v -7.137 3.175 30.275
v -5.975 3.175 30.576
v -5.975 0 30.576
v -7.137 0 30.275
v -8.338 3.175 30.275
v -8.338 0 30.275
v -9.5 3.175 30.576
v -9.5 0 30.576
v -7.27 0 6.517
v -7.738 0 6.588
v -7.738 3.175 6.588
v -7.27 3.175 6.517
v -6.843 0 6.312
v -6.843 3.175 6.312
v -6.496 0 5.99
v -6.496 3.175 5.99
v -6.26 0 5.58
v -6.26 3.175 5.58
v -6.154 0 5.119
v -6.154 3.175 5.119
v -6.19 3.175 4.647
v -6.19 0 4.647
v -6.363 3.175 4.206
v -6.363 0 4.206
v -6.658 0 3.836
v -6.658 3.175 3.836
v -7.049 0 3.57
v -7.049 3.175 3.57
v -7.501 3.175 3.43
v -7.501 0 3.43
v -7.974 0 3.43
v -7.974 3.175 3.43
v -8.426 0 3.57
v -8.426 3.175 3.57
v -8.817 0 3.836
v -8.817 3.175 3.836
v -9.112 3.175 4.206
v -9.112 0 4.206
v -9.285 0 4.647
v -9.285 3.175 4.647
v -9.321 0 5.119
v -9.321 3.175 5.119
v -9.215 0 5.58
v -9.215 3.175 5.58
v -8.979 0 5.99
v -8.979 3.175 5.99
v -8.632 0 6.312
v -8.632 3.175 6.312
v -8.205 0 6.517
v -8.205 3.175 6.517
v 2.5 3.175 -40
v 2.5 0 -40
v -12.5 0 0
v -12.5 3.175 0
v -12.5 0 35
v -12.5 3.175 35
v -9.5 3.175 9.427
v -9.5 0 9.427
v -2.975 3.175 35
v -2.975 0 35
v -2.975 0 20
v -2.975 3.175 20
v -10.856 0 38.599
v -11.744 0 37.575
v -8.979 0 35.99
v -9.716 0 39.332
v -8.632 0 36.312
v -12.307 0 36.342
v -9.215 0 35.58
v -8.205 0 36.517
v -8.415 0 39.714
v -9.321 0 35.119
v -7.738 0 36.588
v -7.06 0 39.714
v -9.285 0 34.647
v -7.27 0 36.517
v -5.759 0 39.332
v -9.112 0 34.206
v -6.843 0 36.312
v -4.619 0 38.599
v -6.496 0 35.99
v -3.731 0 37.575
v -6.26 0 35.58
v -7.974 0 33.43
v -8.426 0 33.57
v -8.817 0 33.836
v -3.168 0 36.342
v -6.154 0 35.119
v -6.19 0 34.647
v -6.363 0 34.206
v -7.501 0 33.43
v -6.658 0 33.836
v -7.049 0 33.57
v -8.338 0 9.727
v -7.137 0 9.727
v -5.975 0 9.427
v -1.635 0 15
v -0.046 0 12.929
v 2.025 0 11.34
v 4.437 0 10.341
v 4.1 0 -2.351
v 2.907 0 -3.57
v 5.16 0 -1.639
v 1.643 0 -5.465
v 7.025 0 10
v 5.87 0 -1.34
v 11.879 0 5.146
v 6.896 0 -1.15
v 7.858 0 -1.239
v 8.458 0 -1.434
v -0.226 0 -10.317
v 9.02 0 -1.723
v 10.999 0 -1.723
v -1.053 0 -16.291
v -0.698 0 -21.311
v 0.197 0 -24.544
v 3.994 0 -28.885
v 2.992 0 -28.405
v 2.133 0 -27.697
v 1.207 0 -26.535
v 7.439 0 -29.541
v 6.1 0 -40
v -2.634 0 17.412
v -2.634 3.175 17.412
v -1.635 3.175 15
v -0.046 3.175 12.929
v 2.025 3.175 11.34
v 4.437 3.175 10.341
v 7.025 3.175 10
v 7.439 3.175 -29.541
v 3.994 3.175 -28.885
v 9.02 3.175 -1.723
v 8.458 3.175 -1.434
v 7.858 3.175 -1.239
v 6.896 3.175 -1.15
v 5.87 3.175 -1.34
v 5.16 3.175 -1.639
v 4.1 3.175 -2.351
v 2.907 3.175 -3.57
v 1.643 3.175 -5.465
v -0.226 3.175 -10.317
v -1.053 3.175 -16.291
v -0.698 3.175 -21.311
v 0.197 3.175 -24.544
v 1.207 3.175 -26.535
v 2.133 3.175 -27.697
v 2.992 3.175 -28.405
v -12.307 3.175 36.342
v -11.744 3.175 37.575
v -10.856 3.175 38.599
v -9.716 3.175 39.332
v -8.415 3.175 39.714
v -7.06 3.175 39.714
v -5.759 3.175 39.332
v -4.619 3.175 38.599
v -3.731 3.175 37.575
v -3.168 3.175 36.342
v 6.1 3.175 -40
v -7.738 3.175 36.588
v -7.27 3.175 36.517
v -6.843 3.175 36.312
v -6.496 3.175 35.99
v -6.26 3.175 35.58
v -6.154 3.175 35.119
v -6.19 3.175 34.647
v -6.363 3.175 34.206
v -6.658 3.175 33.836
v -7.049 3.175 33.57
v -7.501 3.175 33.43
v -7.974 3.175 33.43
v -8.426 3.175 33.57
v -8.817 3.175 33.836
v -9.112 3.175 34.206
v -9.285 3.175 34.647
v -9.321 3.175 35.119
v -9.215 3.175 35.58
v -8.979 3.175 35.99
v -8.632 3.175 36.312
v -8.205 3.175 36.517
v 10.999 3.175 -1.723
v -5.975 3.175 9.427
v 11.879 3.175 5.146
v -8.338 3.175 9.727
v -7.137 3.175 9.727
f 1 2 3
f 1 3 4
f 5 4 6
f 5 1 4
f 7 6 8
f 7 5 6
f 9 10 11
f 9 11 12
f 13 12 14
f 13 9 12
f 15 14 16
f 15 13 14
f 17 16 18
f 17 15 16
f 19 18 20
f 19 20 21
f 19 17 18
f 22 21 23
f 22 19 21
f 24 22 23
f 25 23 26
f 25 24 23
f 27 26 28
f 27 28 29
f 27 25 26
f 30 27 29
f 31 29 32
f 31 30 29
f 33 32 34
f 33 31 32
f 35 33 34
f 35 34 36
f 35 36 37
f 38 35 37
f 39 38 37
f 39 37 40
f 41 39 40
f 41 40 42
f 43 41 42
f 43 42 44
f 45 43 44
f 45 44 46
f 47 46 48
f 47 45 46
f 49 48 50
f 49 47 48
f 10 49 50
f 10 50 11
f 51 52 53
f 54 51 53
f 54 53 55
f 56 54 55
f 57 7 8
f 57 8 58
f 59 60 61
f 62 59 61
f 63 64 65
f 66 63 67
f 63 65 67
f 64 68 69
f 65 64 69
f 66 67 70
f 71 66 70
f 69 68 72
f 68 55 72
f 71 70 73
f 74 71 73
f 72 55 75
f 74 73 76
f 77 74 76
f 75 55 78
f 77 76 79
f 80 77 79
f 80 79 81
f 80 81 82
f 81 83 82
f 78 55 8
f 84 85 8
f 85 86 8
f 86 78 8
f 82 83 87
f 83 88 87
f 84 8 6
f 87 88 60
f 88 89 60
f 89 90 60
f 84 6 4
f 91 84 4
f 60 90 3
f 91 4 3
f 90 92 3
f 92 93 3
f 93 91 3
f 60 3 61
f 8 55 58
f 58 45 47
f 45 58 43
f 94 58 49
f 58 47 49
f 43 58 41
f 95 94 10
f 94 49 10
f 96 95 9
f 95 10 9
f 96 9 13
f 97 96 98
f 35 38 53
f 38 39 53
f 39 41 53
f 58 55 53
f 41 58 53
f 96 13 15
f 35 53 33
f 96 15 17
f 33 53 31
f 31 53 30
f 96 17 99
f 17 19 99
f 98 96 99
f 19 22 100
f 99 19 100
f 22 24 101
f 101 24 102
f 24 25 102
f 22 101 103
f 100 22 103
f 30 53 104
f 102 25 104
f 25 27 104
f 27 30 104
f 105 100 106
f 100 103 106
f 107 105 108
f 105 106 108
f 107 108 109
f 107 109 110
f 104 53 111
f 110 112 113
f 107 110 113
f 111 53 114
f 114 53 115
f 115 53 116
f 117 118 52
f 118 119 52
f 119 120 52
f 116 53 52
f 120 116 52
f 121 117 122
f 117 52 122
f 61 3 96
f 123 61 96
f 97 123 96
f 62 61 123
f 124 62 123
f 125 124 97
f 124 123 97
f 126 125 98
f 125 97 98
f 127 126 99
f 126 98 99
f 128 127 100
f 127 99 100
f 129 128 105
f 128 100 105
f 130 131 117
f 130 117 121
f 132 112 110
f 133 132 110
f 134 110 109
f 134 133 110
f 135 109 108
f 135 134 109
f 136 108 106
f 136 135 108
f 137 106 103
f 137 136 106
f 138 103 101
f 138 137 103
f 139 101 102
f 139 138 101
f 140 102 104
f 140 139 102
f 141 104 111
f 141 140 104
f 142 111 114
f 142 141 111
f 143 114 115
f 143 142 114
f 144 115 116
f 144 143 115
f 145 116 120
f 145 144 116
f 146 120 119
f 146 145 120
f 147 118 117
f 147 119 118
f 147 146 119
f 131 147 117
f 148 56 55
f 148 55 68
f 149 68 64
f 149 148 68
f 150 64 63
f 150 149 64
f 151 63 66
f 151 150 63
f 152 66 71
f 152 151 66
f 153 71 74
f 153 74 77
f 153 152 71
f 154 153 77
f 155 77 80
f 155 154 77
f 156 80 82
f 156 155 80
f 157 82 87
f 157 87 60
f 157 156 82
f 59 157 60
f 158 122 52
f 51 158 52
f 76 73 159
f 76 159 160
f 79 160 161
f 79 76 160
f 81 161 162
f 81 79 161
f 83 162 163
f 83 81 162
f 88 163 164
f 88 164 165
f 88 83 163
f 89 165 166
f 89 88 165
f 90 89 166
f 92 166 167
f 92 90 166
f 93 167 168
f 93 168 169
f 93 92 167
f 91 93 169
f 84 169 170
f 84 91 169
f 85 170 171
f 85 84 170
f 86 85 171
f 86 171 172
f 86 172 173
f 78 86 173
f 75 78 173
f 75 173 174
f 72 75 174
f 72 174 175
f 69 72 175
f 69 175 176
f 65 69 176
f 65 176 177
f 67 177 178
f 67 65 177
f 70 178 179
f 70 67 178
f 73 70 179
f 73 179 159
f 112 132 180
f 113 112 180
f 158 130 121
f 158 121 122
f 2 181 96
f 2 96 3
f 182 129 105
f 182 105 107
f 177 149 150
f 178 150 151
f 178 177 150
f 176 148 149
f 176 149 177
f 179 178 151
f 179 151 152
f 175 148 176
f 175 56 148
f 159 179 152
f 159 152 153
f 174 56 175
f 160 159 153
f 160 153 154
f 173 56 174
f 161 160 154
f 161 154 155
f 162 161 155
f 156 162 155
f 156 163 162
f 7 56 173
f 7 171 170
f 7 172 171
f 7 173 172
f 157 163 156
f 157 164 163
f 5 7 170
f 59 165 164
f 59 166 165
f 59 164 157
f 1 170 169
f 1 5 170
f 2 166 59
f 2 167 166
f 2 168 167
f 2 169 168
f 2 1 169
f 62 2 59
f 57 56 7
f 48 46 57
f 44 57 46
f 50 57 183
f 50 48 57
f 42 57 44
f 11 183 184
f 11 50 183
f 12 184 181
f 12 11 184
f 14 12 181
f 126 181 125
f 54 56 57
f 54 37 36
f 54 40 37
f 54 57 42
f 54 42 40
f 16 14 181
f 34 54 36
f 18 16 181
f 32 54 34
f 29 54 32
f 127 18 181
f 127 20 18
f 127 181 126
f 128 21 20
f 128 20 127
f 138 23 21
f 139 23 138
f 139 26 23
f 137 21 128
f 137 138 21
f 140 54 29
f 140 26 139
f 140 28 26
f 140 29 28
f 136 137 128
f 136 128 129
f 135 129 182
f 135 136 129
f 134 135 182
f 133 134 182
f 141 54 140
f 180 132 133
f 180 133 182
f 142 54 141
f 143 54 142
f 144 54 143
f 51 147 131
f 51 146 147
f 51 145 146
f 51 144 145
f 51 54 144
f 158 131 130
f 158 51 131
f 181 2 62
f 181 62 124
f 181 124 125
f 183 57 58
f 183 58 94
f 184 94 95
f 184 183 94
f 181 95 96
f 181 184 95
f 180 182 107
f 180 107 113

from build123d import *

# Parameters (mm, degrees)
CROQUIS1_R                   = 1.5875
SALIENTE_EXTRUIR1_DEPTH      = 3.175
CORTAR_EXTRUIR1_DEPTH        = 3.175
CORTAR_EXTRUIR3_DEPTH        = 10
CROQUIS4_R                   = 10
CORTAR_EXTRUIR4_DEPTH        = 10
REDONDEO1_R                  = 2
ENL_V_MAT_EXTRU_1_DEPTH      = 43.027736377
ENL_V_MAT_EXTRU_1_DEPTH_BACK = 4
ESQUISSE1_RX                 = 14
ESQUISSE1_RY                 = 7.031711939
ESQUISSE2_W                  = 9.071953096
ESQUISSE2_H                  = 3.948156649
ENL_V_MAT_EXTRU_2_DEPTH      = 43.02773651
CHANFREIN1_START             = -27.627623392
CHANFREIN1_OUTLINE_W         = 3.506874848
CHANFREIN1_OUTLINE_H         = 3.175
CHANFREIN1_DEPTH             = 1.390086692
CHANFREIN1_START_2           = -27.652783734
CHANFREIN1_2_OUTLINE_W       = 3.506874848
CHANFREIN1_2_OUTLINE_H       = 3.175
CHANFREIN1_2_DEPTH           = 0.025160342


with BuildPart() as part:
    # Croquis1 → Saliente-Extruir1 (new body)
    with BuildSketch(Plane(origin=(0, 0, 0), x_dir=(1, 0, 0), z_dir=(0, 1, 0))):
        with BuildLine():
            Line((-12.5, 0), (-12.5, -40))
            Line((-12.5, -40), (-2.975, -40))
            Line((-2.975, -40), (-2.975, -20))
            ThreePointArc((-2.975, -20), (-0.046067812, -12.928932188), (7.025, -10))
            Line((7.025, -10), (12.5, -10))
            Line((12.5, -10), (12.5, 40))
            Line((12.5, 40), (2.5, 40))
            Line((2.5, 40), (-12.5, 0))
        make_face()
        with Locations(Location((-7.7375, -5, 0), (0, 0, 270))):
            Circle(CROQUIS1_R, mode=Mode.SUBTRACT)
        with Locations(Location((-7.7375, -35, 0), (0, 0, 270))):
            Circle(CROQUIS1_R, mode=Mode.SUBTRACT)
    extrude(amount=SALIENTE_EXTRUIR1_DEPTH)

    # Croquis2 → Cortar-Extruir1 (cut)
    with BuildSketch(Plane(origin=(0, 3.175, 0), x_dir=(1, 0, 0), z_dir=(0, 1, 0))):
        Polygon((12.5, -10), (6.1, 40), (12.5, 40), align=None)
    extrude(amount=-CORTAR_EXTRUIR1_DEPTH, mode=Mode.SUBTRACT)

    # Croquis3 → Cortar-Extruir3 (cut)
    with BuildSketch(Plane(origin=(0, 3.175, 0), x_dir=(1, 0, 0), z_dir=(0, 1, 0))):
        with BuildLine():
            ThreePointArc((-5.975, -30.575635639), (-7.7375, -30.2375), (-9.5, -30.575635639))
            Line((-9.5, -30.575635639), (-9.5, -9.427055314))
            ThreePointArc((-9.5, -9.427055314), (-7.7375, -9.765), (-5.975, -9.427055314))
            Line((-5.975, -9.427055314), (-5.975, -14.803847577))
            Line((-5.975, -14.803847577), (-5.975, -30.575635639))
        make_face()
        with BuildLine():
            ThreePointArc((-12.5, -35), (-7.7375, -39.7625), (-2.975, -35))
            Line((-2.975, -35), (-2.975, -40))
            Line((-2.975, -40), (-12.5, -40))
            Line((-12.5, -40), (-12.5, -35))
        make_face()
    extrude(amount=-CORTAR_EXTRUIR3_DEPTH, mode=Mode.SUBTRACT)

    # Croquis4 → Cortar-Extruir4 (cut)
    with BuildSketch(Plane(origin=(0, 3.175, 0), x_dir=(1, 0, 0), z_dir=(0, 1, 0))):
        with Locations((9.274103387, 15.202317292)):
            Circle(CROQUIS4_R)
        Polygon((7.025, -10), (11.878723404, -5.146276596), (12.5, -10), align=None)
    extrude(amount=-CORTAR_EXTRUIR4_DEPTH, mode=Mode.SUBTRACT)

    # Redondeo1
    redondeo1_edges = [part.edges().sort_by_distance(p)[0] for p in [
        (8.004462032, 1.5875, -25.121390375),
        (10.543744741, 1.5875, -5.283244209),
    ]]
    fillet(redondeo1_edges, radius=REDONDEO1_R)

    # Esquisse1 → Enlèv. mat.-Extru.1 (cut, two sides: drawn at the far end of the back side and taken through both)
    with BuildSketch(Plane.XZ.offset(-ENL_V_MAT_EXTRU_1_DEPTH_BACK)):
        with Locations(Location((6.06176106, -15.09925225), (0, 0, -95.443545347))):
            Ellipse(ESQUISSE1_RX, ESQUISSE1_RY)
    extrude(amount=ENL_V_MAT_EXTRU_1_DEPTH + ENL_V_MAT_EXTRU_1_DEPTH_BACK, mode=Mode.SUBTRACT)

    # Esquisse2 → Enlèv. mat.-Extru.2 (cut, through all)
    with BuildSketch(Plane(origin=(0, 3.175, 0), x_dir=(1, 0, 0), z_dir=(0, 1, 0))):
        with Locations((11.233998337, 3.697201044)):
            Rectangle(ESQUISSE2_W, ESQUISSE2_H)
    extrude(amount=-ENL_V_MAT_EXTRU_2_DEPTH, mode=Mode.SUBTRACT)

    # Chanfrein1: read off the stored shape, not the designer's step
    # Chanfrein1 outline → Chanfrein1 (cut)
    with BuildSketch(Plane(origin=(0, 0, 0), x_dir=(0.9823357851879482, 0, -0.18712670878091503), z_dir=(0.18712670878091503, 0, 0.9823357851879482)).offset(CHANFREIN1_START)):
        with Locations((11.081851268, 1.5875)):
            Rectangle(CHANFREIN1_OUTLINE_W, CHANFREIN1_OUTLINE_H)
    extrude(amount=CHANFREIN1_DEPTH, mode=Mode.SUBTRACT)

    # Chanfrein1 2 outline → Chanfrein1 2 (add)
    with BuildSketch(Plane(origin=(0, 0, 0), x_dir=(0.9823357851879482, 0, -0.18712670878091503), z_dir=(0.18712670878091503, 0, 0.9823357851879482)).offset(CHANFREIN1_START_2)):
        with Locations((11.081851268, 1.5875)):
            Rectangle(CHANFREIN1_2_OUTLINE_W, CHANFREIN1_2_OUTLINE_H)
    extrude(amount=CHANFREIN1_2_DEPTH)


solid = part.part
